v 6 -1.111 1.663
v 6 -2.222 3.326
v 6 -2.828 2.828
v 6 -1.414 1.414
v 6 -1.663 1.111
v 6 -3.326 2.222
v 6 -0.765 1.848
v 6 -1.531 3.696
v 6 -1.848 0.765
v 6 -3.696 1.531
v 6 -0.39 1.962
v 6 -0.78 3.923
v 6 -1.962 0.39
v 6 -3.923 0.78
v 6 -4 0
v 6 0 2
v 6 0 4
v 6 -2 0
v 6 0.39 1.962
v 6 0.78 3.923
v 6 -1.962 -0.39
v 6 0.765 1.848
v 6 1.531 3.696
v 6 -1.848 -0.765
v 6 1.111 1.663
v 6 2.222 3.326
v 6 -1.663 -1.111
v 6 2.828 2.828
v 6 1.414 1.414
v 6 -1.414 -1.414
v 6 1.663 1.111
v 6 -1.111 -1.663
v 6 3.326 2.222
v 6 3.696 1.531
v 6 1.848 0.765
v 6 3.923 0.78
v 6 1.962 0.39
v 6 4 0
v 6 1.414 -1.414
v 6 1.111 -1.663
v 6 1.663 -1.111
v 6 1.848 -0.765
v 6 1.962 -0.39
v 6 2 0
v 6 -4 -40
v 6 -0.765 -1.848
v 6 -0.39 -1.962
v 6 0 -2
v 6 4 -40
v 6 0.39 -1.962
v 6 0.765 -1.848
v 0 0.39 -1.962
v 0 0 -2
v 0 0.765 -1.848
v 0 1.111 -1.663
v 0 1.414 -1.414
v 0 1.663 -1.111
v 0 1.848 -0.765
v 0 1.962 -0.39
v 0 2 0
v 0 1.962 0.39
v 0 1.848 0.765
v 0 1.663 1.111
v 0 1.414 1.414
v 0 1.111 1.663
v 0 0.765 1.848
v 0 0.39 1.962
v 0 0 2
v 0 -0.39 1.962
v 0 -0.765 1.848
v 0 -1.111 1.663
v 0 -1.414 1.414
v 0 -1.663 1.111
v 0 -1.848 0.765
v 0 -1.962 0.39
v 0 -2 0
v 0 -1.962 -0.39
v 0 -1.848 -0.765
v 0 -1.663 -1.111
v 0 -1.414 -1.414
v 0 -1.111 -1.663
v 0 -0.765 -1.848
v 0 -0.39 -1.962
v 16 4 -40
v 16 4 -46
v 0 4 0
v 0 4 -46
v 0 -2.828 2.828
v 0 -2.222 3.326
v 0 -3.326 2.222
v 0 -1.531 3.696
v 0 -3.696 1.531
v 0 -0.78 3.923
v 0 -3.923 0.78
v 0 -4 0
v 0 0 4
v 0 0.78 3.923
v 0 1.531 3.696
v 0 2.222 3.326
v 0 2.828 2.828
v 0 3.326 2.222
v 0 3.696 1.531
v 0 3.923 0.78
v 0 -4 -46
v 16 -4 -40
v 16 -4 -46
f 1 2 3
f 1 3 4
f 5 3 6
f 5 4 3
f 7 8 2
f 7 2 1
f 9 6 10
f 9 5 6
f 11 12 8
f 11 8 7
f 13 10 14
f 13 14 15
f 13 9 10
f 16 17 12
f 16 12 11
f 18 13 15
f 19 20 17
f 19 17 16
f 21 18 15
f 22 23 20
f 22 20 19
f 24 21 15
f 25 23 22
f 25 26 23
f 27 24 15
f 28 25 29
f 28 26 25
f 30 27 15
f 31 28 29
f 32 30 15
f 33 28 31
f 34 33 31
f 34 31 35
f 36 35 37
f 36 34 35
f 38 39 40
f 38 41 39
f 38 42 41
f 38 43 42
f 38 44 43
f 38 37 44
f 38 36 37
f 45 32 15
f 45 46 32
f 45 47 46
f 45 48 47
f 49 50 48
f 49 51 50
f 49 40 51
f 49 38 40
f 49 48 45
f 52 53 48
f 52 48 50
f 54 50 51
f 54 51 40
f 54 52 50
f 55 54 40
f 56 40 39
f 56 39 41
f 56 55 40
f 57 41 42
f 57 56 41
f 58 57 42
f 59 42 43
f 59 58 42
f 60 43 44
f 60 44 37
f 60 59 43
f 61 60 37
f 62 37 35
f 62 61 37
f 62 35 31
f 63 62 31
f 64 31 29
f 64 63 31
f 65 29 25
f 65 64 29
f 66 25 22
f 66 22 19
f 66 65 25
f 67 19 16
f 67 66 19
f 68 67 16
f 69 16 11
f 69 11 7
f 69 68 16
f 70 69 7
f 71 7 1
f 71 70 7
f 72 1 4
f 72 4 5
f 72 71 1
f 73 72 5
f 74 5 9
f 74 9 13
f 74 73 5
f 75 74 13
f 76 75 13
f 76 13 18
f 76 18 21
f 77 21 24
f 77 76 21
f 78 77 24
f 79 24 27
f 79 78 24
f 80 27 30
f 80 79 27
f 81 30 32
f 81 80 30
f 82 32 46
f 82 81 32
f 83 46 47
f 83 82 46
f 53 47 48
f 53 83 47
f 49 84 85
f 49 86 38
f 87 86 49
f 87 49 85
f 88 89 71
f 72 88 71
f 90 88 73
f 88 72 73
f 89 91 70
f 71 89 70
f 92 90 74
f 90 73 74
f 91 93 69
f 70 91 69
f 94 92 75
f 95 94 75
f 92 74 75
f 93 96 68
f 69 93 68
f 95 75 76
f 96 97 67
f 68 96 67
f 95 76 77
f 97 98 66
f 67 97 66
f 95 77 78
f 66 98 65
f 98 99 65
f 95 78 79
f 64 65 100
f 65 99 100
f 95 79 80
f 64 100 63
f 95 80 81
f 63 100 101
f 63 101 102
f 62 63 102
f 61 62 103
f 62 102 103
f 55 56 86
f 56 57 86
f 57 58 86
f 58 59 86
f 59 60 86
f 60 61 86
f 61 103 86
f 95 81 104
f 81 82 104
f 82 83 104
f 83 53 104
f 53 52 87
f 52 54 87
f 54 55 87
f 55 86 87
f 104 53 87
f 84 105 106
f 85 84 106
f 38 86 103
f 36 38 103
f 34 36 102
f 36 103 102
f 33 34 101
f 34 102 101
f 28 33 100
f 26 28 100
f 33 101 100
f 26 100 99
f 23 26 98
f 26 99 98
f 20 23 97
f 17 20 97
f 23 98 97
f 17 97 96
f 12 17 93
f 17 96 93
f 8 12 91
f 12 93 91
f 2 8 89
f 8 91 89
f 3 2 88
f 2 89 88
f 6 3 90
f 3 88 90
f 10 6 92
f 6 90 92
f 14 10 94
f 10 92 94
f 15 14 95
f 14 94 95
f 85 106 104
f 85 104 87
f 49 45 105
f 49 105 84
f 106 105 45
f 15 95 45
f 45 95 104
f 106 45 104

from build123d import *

# Parameters (mm, degrees)
SZKIC1_R                    = 4
SZKIC1_R_2                  = 2
DODANIE_WYCI_GNI_CIE1_DEPTH = 6
SZKIC2_W                    = 6
SZKIC2_H                    = 8
DODANIE_WYCI_GNI_CIE2_DEPTH = 10


with BuildPart() as part:
    # Szkic1 → Dodanie-wyciągnięcie1 (new body)
    # profile 1 of 2: a face of its own
    with BuildSketch(Plane(origin=(0, 0, 0), x_dir=(0, 0, -1), z_dir=(1, 0, 0))):
        with BuildLine():
            Line((46, 4), (0, 4))
            ThreePointArc((0, 4), (2.828427125, 2.828427125), (4, 0))
            ThreePointArc((4, 0), (2.828427125, -2.828427125), (0, -4))
            Line((0, -4), (46, -4))
            Line((46, -4), (46, 4))
        make_face()
    # profile 2 of 2: a face of its own
    with BuildSketch(Plane(origin=(0, 0, 0), x_dir=(0, 0, -1), z_dir=(1, 0, 0))):
        Circle(SZKIC1_R)
        Circle(SZKIC1_R_2, mode=Mode.SUBTRACT)
    extrude(amount=DODANIE_WYCI_GNI_CIE1_DEPTH)

    # Szkic2 → Dodanie-wyciągnięcie2 (add)
    with BuildSketch(Plane(origin=(6, 0, 0), x_dir=(0, 0, -1), z_dir=(1, 0, 0))):
        with Locations((43, 0)):
            Rectangle(SZKIC2_W, SZKIC2_H)
    extrude(amount=DODANIE_WYCI_GNI_CIE2_DEPTH)


solid = part.part
